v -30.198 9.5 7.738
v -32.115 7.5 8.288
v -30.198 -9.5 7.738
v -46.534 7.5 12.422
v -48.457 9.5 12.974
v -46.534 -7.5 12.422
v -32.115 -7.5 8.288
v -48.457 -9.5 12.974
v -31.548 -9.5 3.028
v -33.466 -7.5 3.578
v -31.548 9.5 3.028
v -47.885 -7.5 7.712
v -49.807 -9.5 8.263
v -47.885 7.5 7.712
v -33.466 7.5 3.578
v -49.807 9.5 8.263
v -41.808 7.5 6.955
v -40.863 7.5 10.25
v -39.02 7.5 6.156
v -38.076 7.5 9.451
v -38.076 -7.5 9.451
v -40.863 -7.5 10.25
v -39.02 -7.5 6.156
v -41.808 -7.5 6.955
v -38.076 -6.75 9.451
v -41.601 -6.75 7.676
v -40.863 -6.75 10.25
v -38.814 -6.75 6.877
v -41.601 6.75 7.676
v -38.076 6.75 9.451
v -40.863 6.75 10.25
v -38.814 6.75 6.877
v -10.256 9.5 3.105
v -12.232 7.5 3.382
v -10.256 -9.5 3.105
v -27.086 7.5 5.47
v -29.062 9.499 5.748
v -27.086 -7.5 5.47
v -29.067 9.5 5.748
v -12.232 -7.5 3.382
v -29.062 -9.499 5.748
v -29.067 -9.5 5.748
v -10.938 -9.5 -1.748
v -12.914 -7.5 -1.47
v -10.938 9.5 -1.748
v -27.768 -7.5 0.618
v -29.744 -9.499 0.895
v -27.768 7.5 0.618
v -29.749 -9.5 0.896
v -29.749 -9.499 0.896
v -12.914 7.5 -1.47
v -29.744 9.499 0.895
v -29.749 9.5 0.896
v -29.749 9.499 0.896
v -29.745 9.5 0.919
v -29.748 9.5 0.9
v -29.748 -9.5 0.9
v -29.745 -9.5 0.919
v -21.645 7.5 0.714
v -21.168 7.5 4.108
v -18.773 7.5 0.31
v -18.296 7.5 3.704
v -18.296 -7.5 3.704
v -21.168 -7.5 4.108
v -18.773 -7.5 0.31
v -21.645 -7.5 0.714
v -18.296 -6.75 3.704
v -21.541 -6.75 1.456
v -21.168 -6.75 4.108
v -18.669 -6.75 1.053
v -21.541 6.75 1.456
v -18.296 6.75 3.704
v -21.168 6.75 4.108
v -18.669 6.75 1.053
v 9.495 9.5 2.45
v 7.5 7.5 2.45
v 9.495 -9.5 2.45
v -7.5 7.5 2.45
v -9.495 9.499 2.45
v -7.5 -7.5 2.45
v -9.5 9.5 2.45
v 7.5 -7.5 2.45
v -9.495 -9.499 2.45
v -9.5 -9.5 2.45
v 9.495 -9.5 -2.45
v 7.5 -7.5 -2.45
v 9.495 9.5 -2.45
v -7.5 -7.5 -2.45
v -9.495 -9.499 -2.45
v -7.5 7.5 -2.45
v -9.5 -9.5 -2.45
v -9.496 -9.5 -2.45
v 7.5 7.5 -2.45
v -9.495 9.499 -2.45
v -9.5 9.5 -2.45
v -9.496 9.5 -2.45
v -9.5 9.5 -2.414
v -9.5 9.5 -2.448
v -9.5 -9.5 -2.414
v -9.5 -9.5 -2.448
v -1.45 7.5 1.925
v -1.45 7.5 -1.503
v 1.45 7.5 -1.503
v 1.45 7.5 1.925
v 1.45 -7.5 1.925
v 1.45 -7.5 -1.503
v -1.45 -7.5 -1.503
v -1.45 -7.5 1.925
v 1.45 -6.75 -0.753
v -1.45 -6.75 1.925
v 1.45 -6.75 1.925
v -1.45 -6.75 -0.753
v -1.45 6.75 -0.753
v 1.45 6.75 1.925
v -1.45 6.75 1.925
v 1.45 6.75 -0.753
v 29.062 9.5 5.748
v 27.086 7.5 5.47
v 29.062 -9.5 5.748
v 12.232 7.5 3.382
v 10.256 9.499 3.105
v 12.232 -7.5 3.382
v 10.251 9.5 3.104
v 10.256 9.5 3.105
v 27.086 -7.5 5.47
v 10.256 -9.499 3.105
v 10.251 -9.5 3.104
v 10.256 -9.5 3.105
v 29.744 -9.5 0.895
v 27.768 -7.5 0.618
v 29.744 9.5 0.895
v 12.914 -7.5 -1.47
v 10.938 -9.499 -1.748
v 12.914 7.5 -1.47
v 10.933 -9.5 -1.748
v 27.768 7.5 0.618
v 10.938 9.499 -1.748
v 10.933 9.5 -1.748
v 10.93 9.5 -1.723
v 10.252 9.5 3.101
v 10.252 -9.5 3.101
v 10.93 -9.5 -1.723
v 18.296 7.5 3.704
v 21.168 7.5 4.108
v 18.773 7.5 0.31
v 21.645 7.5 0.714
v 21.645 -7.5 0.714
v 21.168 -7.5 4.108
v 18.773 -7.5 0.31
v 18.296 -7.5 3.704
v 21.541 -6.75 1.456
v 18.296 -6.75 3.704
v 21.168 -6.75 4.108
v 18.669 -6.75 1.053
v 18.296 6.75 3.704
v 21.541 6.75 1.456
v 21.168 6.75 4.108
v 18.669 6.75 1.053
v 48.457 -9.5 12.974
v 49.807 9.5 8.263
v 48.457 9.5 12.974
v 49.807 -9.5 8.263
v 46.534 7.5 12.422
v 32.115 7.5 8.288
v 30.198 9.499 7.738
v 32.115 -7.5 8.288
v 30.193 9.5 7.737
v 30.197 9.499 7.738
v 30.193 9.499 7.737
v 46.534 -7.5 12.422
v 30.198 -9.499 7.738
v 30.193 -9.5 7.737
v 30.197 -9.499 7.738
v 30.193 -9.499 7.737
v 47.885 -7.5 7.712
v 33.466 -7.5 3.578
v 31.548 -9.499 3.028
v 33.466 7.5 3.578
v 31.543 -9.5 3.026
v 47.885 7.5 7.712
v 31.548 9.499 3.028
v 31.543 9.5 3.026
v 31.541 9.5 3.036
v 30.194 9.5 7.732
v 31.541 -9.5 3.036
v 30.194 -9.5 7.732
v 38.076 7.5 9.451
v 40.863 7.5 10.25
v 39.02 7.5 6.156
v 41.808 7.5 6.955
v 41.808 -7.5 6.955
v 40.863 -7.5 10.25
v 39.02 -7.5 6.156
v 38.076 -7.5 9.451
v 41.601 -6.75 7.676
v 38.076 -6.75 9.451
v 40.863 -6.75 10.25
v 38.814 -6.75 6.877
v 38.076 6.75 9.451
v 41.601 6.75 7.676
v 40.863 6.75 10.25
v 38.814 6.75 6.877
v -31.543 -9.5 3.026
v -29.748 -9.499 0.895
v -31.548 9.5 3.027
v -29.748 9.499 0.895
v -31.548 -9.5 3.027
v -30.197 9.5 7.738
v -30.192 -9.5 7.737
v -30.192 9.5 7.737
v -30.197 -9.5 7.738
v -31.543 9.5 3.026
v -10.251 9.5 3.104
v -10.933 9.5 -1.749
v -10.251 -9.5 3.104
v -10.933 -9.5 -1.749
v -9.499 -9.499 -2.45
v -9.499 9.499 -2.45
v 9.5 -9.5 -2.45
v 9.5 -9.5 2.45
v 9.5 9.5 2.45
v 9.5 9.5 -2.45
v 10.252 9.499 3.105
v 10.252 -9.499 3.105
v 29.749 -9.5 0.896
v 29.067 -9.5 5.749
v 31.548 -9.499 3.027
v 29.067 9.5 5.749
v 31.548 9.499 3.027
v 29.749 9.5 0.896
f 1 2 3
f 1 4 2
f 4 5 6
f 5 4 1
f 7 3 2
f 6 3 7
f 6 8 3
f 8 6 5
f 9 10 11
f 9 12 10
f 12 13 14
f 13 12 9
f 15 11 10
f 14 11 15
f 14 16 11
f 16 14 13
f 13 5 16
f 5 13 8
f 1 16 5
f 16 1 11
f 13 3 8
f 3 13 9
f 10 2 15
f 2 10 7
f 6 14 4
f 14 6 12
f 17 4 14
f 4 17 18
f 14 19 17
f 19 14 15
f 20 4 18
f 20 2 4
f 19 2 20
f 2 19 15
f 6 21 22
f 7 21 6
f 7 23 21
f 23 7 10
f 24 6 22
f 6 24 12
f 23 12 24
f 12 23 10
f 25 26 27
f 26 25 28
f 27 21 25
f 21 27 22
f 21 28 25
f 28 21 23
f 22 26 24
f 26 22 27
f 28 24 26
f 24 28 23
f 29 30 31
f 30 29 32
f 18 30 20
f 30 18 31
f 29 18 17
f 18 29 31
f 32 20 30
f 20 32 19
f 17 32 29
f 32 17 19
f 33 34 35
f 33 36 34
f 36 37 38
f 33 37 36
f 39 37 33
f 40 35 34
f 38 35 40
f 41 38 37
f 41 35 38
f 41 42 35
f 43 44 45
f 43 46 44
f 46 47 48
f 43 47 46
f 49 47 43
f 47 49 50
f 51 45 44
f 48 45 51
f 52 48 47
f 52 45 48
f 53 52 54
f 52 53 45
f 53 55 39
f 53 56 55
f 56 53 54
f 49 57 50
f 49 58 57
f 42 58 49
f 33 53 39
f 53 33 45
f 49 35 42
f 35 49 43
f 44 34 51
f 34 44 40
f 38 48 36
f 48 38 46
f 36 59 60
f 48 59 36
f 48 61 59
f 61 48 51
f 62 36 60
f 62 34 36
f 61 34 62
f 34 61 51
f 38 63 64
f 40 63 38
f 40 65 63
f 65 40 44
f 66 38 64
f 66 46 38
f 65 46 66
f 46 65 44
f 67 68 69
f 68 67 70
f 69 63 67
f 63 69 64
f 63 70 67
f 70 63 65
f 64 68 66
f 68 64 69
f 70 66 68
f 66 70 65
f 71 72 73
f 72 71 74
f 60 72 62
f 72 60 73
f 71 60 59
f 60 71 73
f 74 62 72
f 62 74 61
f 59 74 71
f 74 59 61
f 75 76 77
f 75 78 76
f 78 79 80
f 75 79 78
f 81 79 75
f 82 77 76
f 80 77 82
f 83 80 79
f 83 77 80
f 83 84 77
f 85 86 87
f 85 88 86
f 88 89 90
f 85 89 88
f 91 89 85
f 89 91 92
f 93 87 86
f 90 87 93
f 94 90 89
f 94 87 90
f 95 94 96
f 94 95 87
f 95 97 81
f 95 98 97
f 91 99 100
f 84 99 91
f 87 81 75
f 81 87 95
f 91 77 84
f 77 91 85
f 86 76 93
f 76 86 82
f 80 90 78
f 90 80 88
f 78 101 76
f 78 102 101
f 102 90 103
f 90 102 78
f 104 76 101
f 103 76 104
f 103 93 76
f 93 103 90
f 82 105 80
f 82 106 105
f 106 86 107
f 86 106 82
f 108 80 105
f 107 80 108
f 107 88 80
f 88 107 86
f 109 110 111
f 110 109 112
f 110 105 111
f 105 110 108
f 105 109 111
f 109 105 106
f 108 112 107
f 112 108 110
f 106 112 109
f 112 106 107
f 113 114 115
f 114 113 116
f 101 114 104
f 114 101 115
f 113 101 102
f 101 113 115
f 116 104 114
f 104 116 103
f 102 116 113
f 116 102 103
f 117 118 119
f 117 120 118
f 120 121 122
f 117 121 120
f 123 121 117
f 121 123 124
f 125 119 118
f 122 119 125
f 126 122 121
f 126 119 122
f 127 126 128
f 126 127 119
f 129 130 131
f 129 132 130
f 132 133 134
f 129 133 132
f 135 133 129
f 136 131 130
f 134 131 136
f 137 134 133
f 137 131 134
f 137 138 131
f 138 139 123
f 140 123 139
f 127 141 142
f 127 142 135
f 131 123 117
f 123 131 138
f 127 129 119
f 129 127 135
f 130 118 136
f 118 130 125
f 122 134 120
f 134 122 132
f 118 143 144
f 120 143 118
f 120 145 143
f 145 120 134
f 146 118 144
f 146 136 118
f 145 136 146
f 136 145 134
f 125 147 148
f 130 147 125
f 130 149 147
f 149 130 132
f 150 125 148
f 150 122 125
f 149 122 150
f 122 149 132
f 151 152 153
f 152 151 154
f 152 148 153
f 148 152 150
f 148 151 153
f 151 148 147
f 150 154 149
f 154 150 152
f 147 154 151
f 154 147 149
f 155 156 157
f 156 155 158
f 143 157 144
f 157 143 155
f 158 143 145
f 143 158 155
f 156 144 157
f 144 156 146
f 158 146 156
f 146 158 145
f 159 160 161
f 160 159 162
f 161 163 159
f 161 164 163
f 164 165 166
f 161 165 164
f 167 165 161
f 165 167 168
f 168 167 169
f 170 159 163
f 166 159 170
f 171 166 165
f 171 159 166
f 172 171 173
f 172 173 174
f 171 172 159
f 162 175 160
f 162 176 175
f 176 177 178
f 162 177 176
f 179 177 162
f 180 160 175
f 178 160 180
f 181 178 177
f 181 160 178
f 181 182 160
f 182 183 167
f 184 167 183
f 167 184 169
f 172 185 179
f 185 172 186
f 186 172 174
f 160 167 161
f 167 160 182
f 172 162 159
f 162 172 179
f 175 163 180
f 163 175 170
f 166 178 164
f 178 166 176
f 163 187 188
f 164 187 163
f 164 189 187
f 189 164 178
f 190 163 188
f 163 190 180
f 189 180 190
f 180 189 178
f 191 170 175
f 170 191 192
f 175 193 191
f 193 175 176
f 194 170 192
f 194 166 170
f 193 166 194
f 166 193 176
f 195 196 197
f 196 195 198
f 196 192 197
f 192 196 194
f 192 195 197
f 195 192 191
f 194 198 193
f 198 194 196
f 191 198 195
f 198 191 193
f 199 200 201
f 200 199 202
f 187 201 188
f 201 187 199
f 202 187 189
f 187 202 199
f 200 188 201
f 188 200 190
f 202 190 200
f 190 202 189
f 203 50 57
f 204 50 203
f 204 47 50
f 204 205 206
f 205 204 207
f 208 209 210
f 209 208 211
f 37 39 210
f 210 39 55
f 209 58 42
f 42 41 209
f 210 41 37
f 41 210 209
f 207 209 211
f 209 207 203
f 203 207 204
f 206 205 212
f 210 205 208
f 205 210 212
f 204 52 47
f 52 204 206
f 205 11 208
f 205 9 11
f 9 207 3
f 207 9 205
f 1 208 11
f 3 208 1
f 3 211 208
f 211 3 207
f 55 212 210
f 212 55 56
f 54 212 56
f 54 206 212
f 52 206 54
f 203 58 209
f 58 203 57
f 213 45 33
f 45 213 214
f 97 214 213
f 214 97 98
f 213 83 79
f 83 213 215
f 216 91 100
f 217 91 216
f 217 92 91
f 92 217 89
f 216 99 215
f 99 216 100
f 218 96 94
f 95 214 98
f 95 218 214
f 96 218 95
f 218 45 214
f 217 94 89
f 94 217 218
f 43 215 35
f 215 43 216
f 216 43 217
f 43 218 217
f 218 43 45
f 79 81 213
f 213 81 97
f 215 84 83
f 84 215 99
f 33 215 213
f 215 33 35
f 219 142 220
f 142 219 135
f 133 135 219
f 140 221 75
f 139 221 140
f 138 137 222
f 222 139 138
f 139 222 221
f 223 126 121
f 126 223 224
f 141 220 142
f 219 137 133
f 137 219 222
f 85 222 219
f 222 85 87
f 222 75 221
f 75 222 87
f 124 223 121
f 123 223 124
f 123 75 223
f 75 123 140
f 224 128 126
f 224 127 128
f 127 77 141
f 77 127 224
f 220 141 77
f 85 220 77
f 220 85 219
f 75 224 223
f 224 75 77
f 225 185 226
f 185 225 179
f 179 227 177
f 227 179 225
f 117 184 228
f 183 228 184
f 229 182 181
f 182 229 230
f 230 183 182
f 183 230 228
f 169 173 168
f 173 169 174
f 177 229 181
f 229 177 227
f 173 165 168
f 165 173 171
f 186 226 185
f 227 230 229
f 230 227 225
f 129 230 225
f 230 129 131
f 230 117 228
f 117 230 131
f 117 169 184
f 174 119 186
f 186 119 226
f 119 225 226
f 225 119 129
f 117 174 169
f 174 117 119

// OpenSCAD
 union () {
         union () {
           translate ([-40.0, 0, 8.0]) {
            rotate (a=16.0, v=[0, 1, 0]) {
            thing();
            }
           }
         }
         union () {
           translate ([-20.0, 0, 2.0]) {
            rotate (a=8.0, v=[0, 1, 0]) {
            thing();
        
            }
           }
         }
         union () {
           translate ([0.0, 0, 0.0]) {
            rotate (a=-0.0, v=[0, 1, 0]) {
            thing();
        
            }
           }
         }
         union () {
           translate ([20.0, 0, 2.0]) {
            rotate (a=-8.0, v=[0, 1, 0]) {
            thing();
        
            }
           }
         }
         union () {
           translate ([40.0, 0, 8.0]) {
            rotate (a=-16.0, v=[0, 1, 0]) {
            thing();
        
            }
           }
         }

}
color("red"){
hull(){ 
 union () {
   translate ([-40.0, 0, 8.0]) {
    rotate (a=16.0, v=[0, 1, 0]) {
    thingright();
    }
   }
 }
 union () {
   translate ([-20.0, 0, 2.0]){
    rotate (a=8.0, v=[0, 1, 0]) {
    thingleft();

    }
   }
 }
}



hull(){


 union () {
   translate ([-20.0, 0, 2.0]) {
    rotate (a=8.0, v=[0, 1, 0]) {
    thingright();
    }
   }
 }
 union () {
   translate ([-00.0, 0, 0.0]){
    rotate (a=0.0, v=[0, 1, 0]) {
    thingleft();

    }
   }
 }
}

hull(){


 union () {
   translate ([20.0, 0, 2.0]) {
    rotate (a=-8.0, v=[0, 1, 0]) {
   thingleft();
    }
   }
 }
 union () {
   translate ([-00.0, 0, 0.0]){
    rotate (a=0.0, v=[0, 1, 0]) {
     thingright();

    }
   }
 }
}


hull(){
 union () {
   translate ([40.0, 0, 8.0]) {
    rotate (a=-16.0, v=[0, 1, 0]) {
   thingleft();
    }
   }
 }
 union () {
   translate ([20.0, 0, 2.0]){
    rotate (a=-8.0, v=[0, 1, 0]) {
     thingright(); 

    }
   }
 }
}


 }






module thingleft (){ 
 
      render() difference () {
        cube ([19-.001, 19-.001, 4.901], center=true);
        cube ([18.99, 20.001, 10], center=true);
       translate ([10, 0,0]) cube ([25, 20, 10], center=true);
        
       } 
     };
module thingright (){ 
 
      render() difference () {
        cube ([19.001, 19.001, 4.901], center=true);
        cube ([18.99, 20.001, 10], center=true);
       translate ([-10, 0,0]) cube ([25, 20, 10], center=true);
        
       } 
     };


module thing(){ 
 union () {
      render() difference () {
        cube ([19, 19, 4.9], center=true);
        cube ([15, 15, 10], center=true);
        *translate ([0, 0, -3.9]) {
         cube ([15, 15, 4], center=true);
        }
       }
       translate ([0, -7.125, 0]) {
        rotate (a=90.0, v=[0, 0, 1]) {
         rotate (a=180.0, v=[0, 0, 1]) {
           rotate (a=180.0, v=[0, 1, 0]) {
           knob();
           }
         }
        }
       }
       translate ([0, 7.125, 0]) {
        rotate (a=90.0, v=[0, 0, 1]) {
         rotate (a=180.0, v=[0, 1, 0]) {
           knob();
         }
        }
       }
     }};



module knob(){
 render()

difference () {
            cube ([0.75, 2.9, 3.85], center=true);
            translate ([0, 0, 3.85]) {
             rotate (a=45.0, v=[0, 1, 0]) {
               cube ([7.5, 2.9, 3.85], center=true);
             }
            }
           }
}
